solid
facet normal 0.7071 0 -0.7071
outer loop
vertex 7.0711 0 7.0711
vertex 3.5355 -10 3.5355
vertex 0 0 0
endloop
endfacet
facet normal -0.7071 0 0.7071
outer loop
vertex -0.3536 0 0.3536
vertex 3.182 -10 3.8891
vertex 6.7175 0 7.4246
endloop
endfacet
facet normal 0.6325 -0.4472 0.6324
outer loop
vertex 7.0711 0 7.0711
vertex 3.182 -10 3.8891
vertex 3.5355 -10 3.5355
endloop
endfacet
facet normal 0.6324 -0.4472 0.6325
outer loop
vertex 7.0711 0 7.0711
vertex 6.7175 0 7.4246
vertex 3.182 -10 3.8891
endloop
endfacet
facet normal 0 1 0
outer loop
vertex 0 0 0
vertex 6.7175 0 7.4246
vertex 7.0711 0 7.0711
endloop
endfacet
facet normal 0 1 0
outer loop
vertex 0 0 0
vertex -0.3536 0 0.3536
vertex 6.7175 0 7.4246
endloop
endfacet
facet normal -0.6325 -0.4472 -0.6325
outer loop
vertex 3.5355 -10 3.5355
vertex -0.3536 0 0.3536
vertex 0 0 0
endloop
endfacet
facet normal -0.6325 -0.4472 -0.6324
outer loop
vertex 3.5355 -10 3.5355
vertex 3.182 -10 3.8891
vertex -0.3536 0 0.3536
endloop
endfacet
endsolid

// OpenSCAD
include <maths.scad>

steps = 1;
lowangle = 315;
highangle = 315;
thickness = 0.5;

tripointsy = [[0,10,0], [0,0,0],[10,5,10]];
tripointsx = [[0,0,0], [10,0,0],[5,10,10]];
tripointsflat = [[0,0,0], [10,0,0],[5,10,0]];

//rotatex();
//rotatey();
//rotateslab();

placetri(tripointsy);

//========================================
//		Functions
//========================================
function PlaneRotations(v) = [ 
	atan2(sqrt(v[0]*v[0]+v[1]*v[1]), v[2]), 
		0, 
		atan2(v[1], v[0])-270];

//========================================
//		Modules
//========================================

module rotateslab()
{
	for (step = [0:steps])
	{
		assign(angle = lowangle + (highangle-lowangle)*step/steps)
		{
			assign(angles=[angle, 0,0])
			{		
echo("Angles: ", angles);
				rotate([angle, 0,0])
				linear_extrude(height =thickness, convexity = 10) 
				polygon(
				points= [[0,0], [10,0], [10,10], [0,10]],
					paths = [[0,1,2,3]]);

				rotate([0, angle,0])
				linear_extrude(height =thickness, convexity = 10) 
				polygon(
				points= [[0,0], [0,10], [-10,10], [-10,0]],
					paths = [[0,1,2,3]]);

				translate([0,0,10])
				rotate([0, 0,angle])
				linear_extrude(height =thickness, convexity = 10) 
				polygon(
				points= [[0,0], [0,10], [-10,10], [-10,0]],
					paths = [[0,1,2,3]]);

			}
		}
	}
}

module rotatex()
{
	for (step = [0:steps])
	{
		assign(angle = lowangle + (highangle-lowangle)*step/steps)
		{
			assign(points = [[-10, 0, 0], [10, 0, 0], [0, 10*cos(angle), 10*sin(angle)]])
			{ 
				assign(normal = VPROD((points[2]-points[1]),(points[0]-points[1])))
				{
					assign(angles = rotations(normal))
					rotate(angles)
					{
		echo("Points: ", points);
		echo("Normal: ", normal);
		echo("Angles: ", angles);
						//cube(size=[30, thickness, 30], center=true);
				
						linear_extrude(height =thickness, convexity = 10) 
						polygon(
						points= [[-10,0], [10,0], [0,20]],
							paths = [[0,1,2]]);
					}
				}
			}
		}
	}
}

module rotatey()
{
	for (step = [0:steps])
	{
		assign(angle = lowangle + (highangle-lowangle)*step/steps)
		{
			assign(points = [[0, 10, 0], [0, -10, 0], [10*cos(angle), 0, 10*sin(angle)]])
			{ 
				assign(normal = VPROD((points[2]-points[1]),(points[0]-points[1])))
				{
					assign(angles = rotations(normal))
					rotate(angles)
					{
		echo("Points: ", points);
		echo("Normal: ", normal);
		echo("ANGLE: ", angle);
		echo("Angles: ", angles);
						//cube(size=[30, thickness, 30], center=true);
				
						linear_extrude(height =thickness, convexity = 10) 
						polygon(
						points= [[0,10], [0,-10], [20,0]],
							paths = [[0,1,2]]);
					}
				}
			}
		}
	}
}


module placetri(tri)
{

	offset = tri[1];

	op0 = tri[0] - offset;
	op1 = tri[1] - offset;
	op2 = tri[2] - offset;

//	v = tri[0]-tri[1];
//	w = tri[2]-tri[1];

	v = op0-op1;
	w = op2-op1;

echo("POINTS: ", tri);
echo("OFFSET: ", offset);
echo("VECTORS: ", v, w);

	normal = VCROSS(w,v);
echo("NORMAL: ", normal);

	angles = PlaneRotations(normal);
echo("ANGLES: ", angles);

	rotate(angles)
	{
		translate(offset)
		linear_extrude(height =thickness, convexity = 10) 
			polygon(
				points= [
					[op0[0],op0[1]], 
					[op1[0], op1[1]], 
					[op2[0],op2[1]]],
				paths = [[0,1,2]]);
	}
}
